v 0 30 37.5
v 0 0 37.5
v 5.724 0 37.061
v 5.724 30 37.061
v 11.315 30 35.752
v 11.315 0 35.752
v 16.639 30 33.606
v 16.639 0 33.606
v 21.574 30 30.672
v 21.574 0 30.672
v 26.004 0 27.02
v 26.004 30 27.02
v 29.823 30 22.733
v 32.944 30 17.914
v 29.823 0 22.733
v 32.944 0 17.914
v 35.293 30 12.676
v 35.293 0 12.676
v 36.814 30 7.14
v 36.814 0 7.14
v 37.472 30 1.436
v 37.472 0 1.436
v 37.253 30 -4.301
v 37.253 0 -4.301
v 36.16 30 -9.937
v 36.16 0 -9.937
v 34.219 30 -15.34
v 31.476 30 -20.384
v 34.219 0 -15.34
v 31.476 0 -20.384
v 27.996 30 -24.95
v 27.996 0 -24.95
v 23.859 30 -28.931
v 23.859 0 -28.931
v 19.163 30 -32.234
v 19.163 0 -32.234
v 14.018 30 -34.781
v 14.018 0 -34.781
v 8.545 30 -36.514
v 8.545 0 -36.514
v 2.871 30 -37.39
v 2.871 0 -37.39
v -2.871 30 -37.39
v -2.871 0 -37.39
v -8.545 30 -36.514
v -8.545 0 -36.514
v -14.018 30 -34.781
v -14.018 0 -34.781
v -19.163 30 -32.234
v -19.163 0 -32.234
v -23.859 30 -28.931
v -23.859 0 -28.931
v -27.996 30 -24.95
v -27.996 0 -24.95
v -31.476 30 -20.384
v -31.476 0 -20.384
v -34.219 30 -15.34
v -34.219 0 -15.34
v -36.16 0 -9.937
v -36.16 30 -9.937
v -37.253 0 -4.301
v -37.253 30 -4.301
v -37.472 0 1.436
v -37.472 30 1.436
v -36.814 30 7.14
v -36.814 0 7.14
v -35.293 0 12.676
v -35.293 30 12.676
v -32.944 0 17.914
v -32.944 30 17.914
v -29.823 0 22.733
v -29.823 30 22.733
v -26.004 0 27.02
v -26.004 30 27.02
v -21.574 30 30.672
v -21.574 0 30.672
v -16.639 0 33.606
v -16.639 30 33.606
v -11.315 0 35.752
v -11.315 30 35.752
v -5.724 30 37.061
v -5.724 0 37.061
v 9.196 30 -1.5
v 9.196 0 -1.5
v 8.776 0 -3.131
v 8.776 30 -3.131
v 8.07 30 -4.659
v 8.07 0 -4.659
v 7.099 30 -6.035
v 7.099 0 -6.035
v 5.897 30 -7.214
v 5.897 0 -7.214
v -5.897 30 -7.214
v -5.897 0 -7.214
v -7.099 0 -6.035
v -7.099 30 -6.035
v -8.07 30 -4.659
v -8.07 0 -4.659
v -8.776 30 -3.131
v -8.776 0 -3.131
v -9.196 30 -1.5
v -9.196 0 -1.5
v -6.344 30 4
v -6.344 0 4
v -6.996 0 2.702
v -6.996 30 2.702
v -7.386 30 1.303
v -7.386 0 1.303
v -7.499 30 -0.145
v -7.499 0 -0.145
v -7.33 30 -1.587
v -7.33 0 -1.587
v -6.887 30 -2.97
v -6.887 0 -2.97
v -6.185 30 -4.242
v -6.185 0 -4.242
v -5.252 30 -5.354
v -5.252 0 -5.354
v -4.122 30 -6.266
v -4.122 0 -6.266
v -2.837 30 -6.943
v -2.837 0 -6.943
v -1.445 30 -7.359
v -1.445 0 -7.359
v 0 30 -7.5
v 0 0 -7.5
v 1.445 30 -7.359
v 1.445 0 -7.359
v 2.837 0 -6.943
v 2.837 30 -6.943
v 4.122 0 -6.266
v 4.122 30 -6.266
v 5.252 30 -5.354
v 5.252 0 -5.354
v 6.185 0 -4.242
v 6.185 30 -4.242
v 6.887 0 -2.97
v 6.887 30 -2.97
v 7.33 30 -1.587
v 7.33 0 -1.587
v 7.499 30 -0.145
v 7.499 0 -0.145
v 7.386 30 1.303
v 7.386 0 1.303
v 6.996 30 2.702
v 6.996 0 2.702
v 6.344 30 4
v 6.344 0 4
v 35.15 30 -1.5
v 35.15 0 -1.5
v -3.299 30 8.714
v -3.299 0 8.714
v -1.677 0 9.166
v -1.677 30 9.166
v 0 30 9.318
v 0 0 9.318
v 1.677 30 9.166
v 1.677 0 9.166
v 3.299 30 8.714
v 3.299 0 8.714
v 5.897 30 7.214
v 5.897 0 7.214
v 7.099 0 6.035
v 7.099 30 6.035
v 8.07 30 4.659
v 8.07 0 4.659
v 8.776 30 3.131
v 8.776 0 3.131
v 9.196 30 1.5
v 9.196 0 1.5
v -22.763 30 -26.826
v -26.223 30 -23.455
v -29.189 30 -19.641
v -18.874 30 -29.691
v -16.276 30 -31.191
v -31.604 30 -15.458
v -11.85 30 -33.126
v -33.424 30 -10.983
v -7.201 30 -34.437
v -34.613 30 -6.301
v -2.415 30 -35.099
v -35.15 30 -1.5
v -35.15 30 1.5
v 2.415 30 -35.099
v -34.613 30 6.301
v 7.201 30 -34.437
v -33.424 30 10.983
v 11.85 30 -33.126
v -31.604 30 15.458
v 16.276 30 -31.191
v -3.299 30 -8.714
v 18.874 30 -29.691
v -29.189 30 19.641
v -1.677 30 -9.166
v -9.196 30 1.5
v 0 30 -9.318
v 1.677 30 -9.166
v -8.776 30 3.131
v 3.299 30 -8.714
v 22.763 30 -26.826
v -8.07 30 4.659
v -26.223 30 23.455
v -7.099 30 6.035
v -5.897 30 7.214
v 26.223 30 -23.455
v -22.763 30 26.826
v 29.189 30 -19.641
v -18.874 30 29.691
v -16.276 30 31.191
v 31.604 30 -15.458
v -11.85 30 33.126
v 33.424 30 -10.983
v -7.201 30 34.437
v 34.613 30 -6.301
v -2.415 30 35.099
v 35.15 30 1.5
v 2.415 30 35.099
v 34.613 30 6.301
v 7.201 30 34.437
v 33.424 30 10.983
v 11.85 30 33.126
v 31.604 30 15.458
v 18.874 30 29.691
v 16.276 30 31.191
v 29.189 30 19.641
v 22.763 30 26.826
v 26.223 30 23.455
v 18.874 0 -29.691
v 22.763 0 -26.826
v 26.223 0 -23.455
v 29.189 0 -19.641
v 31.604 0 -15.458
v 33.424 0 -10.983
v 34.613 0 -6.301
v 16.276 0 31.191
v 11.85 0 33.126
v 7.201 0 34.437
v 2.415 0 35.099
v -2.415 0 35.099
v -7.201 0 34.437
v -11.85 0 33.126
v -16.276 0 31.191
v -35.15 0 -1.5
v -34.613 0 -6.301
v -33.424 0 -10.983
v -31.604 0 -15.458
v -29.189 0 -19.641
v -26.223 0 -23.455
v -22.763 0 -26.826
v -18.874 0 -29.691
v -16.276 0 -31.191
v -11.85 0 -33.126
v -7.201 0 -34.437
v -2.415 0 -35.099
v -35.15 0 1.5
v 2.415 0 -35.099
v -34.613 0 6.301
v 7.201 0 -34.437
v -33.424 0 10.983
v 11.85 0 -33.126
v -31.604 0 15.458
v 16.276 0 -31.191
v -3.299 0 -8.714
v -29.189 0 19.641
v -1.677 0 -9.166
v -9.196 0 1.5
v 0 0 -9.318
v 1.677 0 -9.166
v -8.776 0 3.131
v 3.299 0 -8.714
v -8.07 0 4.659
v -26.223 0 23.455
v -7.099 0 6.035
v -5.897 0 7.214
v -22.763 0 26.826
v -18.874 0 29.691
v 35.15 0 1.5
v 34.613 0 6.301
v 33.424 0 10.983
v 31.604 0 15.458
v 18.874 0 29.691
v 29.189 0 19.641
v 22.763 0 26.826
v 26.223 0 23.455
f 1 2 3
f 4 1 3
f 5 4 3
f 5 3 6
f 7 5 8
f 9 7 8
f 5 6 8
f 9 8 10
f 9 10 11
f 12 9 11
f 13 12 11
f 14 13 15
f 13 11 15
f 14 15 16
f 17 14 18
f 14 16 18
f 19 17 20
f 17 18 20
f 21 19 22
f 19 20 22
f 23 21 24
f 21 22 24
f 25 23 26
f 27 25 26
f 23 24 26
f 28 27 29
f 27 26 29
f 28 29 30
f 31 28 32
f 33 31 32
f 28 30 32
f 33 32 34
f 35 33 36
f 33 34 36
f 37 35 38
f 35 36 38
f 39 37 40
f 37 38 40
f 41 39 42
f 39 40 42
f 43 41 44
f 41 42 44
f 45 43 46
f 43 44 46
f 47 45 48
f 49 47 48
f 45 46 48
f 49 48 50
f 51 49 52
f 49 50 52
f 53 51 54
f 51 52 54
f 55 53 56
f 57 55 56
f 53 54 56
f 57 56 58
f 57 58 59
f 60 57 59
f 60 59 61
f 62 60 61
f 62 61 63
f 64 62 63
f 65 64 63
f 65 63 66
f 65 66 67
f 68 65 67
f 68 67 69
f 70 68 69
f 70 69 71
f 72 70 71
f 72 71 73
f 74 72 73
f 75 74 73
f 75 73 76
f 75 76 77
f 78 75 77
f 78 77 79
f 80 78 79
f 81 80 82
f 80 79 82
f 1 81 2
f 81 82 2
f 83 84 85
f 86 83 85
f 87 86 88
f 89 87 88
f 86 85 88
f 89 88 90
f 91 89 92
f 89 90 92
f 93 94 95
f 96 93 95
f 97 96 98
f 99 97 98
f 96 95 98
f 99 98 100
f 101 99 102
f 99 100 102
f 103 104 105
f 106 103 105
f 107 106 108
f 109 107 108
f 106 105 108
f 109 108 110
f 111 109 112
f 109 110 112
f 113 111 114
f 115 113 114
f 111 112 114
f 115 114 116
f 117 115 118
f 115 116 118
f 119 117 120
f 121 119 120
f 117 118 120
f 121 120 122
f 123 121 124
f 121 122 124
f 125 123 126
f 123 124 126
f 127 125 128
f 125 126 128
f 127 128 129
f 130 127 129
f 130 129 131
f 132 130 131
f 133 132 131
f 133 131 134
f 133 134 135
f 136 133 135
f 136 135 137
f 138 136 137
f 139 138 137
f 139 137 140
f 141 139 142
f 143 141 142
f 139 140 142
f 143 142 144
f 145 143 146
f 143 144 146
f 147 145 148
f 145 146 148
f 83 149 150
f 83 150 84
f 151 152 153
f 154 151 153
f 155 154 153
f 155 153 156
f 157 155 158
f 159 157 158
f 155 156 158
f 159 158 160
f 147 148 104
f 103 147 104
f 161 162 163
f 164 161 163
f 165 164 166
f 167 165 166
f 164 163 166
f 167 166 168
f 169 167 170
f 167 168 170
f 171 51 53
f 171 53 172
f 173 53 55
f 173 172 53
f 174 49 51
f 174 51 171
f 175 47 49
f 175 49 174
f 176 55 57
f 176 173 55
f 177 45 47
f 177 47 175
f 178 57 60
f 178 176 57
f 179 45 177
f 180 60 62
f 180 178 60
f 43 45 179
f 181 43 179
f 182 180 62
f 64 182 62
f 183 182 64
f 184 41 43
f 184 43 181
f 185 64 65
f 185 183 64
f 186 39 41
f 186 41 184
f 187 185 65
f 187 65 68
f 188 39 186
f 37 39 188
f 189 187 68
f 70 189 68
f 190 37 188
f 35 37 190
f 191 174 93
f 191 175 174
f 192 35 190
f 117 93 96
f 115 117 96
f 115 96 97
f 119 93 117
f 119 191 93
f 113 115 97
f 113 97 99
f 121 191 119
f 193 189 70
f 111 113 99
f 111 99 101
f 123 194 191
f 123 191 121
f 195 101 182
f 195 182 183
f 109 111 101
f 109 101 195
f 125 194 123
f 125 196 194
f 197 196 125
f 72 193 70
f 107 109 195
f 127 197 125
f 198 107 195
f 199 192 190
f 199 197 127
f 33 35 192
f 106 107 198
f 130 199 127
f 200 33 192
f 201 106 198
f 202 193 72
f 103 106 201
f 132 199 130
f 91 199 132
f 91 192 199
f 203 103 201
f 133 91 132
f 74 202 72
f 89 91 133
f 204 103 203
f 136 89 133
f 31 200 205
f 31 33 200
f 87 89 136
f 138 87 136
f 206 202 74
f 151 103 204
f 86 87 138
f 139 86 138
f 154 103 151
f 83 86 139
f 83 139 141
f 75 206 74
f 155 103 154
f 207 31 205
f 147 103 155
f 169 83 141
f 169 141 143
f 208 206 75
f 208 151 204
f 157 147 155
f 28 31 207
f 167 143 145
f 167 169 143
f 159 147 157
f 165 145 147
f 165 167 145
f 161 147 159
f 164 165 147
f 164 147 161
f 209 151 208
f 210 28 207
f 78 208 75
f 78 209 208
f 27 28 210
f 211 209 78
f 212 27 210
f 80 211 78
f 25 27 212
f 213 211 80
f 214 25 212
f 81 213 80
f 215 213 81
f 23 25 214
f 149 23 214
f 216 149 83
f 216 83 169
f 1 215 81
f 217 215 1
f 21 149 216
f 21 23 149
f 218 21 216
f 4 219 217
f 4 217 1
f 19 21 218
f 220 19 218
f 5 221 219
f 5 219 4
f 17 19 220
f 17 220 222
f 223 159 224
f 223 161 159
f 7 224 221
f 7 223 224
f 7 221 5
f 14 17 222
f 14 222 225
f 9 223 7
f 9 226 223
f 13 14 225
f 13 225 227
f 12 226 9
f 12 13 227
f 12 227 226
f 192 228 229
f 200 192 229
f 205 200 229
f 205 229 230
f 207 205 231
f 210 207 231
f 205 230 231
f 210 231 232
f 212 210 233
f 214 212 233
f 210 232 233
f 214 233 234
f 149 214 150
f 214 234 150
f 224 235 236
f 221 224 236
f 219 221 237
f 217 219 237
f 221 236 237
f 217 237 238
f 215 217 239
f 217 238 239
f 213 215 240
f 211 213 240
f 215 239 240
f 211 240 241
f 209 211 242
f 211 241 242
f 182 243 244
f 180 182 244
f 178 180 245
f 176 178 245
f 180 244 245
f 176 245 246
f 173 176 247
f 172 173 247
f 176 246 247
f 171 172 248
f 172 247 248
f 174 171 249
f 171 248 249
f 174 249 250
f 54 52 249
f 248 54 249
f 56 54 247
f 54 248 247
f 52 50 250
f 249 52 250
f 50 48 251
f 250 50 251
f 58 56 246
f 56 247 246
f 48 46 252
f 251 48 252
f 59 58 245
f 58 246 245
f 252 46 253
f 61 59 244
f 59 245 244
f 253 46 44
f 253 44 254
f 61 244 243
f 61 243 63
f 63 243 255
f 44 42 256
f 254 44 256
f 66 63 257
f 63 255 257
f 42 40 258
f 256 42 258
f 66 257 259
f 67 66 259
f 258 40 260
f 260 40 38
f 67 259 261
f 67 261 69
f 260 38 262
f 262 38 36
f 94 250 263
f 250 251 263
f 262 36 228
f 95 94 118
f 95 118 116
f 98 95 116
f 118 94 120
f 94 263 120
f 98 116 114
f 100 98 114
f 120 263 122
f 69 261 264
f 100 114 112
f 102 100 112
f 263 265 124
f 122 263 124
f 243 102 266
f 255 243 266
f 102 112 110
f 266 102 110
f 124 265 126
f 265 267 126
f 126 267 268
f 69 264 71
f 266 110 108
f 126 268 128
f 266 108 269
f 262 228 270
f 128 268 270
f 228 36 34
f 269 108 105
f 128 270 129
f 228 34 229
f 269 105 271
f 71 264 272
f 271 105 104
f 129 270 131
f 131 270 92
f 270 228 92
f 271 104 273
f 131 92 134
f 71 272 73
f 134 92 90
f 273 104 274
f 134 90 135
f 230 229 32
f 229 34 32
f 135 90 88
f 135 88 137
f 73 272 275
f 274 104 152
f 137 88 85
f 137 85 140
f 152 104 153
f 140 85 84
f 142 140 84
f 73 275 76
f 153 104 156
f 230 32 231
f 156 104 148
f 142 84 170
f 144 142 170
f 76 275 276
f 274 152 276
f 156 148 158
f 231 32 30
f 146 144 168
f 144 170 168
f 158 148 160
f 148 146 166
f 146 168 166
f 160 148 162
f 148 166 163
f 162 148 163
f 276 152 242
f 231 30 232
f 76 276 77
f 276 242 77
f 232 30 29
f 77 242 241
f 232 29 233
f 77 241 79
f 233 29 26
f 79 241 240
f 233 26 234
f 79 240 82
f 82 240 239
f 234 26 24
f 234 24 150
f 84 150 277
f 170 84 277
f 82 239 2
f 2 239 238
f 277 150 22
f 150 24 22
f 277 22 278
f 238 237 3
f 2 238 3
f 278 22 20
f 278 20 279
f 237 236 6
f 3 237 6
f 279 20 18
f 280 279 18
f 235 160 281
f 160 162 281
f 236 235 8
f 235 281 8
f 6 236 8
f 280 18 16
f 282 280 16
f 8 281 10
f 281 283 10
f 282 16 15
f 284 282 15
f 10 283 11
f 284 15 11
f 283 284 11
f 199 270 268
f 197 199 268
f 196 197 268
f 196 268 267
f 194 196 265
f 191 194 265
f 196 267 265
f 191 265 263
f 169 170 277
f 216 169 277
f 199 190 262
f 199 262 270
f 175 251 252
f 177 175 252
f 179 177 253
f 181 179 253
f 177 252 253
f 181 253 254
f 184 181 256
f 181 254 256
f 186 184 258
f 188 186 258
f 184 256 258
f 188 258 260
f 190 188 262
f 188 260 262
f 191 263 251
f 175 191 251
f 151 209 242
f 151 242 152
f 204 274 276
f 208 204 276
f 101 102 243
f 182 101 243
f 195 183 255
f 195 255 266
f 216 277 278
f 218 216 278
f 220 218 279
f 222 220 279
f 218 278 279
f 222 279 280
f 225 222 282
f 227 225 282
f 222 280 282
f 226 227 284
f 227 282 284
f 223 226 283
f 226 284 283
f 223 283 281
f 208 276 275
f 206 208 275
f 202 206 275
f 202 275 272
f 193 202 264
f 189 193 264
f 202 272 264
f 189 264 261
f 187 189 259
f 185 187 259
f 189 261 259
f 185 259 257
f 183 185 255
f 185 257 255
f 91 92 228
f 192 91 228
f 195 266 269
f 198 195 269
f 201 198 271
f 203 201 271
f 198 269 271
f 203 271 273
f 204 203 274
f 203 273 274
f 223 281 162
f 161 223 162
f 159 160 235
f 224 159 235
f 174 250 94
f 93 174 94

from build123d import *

# Parameters (mm, degrees)
IZIM1_R                     = 37.5
Y_KSEKLIK_EKSTR_ZYON1_DEPTH = 30


with BuildPart() as part:
    # Çizim1 → Yükseklik-Ekstrüzyon1 (new body)
    with BuildSketch(Plane(origin=(0, 0, 0), x_dir=(1, 0, 0), z_dir=(0, 1, 0))):
        with Locations(Location((0, 0, 0), (0, 0, 270))):
            Circle(IZIM1_R)
        with BuildLine():
            ThreePointArc((-18.874079265, -29.690864233), (-30.468569301, -17.591036688), (-35.150082319, -1.5))
            Line((-35.150082319, -1.5), (-9.196399109, -1.5))
            ThreePointArc((-9.196399109, -1.5), (-8.069561167, -4.658963312), (-5.89723766, -7.214315252))
            Line((-5.89723766, -7.214315252), (-18.874079265, -29.690864233))
        make_face(mode=Mode.SUBTRACT)
        with BuildLine():
            Line((3.299161449, -8.714315252), (16.276003054, -31.190864233))
            ThreePointArc((16.276003054, -31.190864233), (0, -35.182073376), (-16.276003054, -31.190864233))
            Line((-16.276003054, -31.190864233), (-3.299161449, -8.714315252))
            ThreePointArc((-3.299161449, -8.714315252), (0, -9.317926624), (3.299161449, -8.714315252))
        make_face(mode=Mode.SUBTRACT)
        with BuildLine():
            Line((9.196399109, -1.5), (35.150082319, -1.5))
            ThreePointArc((35.150082319, -1.5), (30.468569301, -17.591036688), (18.874079265, -29.690864233))
            Line((18.874079265, -29.690864233), (5.89723766, -7.214315252))
            ThreePointArc((5.89723766, -7.214315252), (8.069561167, -4.658963312), (9.196399109, -1.5))
        make_face(mode=Mode.SUBTRACT)
        with BuildLine():
            ThreePointArc((-35.150082319, 1.5), (-30.468569301, 17.591036688), (-18.874079265, 29.690864233))
            Line((-18.874079265, 29.690864233), (-5.89723766, 7.214315252))
            ThreePointArc((-5.89723766, 7.214315252), (-8.069561167, 4.658963312), (-9.196399109, 1.5))
            Line((-9.196399109, 1.5), (-35.150082319, 1.5))
        make_face(mode=Mode.SUBTRACT)
        with BuildLine():
            Line((6.34428877, -4), (-6.34428877, -4))
            ThreePointArc((-6.34428877, -4), (0, 7.5), (6.34428877, -4))
        make_face(mode=Mode.SUBTRACT)
        with BuildLine():
            Line((5.89723766, 7.214315252), (18.874079265, 29.690864233))
            ThreePointArc((18.874079265, 29.690864233), (30.468569301, 17.591036688), (35.150082319, 1.5))
            Line((35.150082319, 1.5), (9.196399109, 1.5))
            ThreePointArc((9.196399109, 1.5), (8.069561167, 4.658963312), (5.89723766, 7.214315252))
        make_face(mode=Mode.SUBTRACT)
        with BuildLine():
            Line((-3.299161449, 8.714315252), (-16.276003054, 31.190864233))
            ThreePointArc((-16.276003054, 31.190864233), (0, 35.182073376), (16.276003054, 31.190864233))
            Line((16.276003054, 31.190864233), (3.299161449, 8.714315252))
            ThreePointArc((3.299161449, 8.714315252), (0, 9.317926624), (-3.299161449, 8.714315252))
        make_face(mode=Mode.SUBTRACT)
    extrude(amount=Y_KSEKLIK_EKSTR_ZYON1_DEPTH)


solid = part.part
